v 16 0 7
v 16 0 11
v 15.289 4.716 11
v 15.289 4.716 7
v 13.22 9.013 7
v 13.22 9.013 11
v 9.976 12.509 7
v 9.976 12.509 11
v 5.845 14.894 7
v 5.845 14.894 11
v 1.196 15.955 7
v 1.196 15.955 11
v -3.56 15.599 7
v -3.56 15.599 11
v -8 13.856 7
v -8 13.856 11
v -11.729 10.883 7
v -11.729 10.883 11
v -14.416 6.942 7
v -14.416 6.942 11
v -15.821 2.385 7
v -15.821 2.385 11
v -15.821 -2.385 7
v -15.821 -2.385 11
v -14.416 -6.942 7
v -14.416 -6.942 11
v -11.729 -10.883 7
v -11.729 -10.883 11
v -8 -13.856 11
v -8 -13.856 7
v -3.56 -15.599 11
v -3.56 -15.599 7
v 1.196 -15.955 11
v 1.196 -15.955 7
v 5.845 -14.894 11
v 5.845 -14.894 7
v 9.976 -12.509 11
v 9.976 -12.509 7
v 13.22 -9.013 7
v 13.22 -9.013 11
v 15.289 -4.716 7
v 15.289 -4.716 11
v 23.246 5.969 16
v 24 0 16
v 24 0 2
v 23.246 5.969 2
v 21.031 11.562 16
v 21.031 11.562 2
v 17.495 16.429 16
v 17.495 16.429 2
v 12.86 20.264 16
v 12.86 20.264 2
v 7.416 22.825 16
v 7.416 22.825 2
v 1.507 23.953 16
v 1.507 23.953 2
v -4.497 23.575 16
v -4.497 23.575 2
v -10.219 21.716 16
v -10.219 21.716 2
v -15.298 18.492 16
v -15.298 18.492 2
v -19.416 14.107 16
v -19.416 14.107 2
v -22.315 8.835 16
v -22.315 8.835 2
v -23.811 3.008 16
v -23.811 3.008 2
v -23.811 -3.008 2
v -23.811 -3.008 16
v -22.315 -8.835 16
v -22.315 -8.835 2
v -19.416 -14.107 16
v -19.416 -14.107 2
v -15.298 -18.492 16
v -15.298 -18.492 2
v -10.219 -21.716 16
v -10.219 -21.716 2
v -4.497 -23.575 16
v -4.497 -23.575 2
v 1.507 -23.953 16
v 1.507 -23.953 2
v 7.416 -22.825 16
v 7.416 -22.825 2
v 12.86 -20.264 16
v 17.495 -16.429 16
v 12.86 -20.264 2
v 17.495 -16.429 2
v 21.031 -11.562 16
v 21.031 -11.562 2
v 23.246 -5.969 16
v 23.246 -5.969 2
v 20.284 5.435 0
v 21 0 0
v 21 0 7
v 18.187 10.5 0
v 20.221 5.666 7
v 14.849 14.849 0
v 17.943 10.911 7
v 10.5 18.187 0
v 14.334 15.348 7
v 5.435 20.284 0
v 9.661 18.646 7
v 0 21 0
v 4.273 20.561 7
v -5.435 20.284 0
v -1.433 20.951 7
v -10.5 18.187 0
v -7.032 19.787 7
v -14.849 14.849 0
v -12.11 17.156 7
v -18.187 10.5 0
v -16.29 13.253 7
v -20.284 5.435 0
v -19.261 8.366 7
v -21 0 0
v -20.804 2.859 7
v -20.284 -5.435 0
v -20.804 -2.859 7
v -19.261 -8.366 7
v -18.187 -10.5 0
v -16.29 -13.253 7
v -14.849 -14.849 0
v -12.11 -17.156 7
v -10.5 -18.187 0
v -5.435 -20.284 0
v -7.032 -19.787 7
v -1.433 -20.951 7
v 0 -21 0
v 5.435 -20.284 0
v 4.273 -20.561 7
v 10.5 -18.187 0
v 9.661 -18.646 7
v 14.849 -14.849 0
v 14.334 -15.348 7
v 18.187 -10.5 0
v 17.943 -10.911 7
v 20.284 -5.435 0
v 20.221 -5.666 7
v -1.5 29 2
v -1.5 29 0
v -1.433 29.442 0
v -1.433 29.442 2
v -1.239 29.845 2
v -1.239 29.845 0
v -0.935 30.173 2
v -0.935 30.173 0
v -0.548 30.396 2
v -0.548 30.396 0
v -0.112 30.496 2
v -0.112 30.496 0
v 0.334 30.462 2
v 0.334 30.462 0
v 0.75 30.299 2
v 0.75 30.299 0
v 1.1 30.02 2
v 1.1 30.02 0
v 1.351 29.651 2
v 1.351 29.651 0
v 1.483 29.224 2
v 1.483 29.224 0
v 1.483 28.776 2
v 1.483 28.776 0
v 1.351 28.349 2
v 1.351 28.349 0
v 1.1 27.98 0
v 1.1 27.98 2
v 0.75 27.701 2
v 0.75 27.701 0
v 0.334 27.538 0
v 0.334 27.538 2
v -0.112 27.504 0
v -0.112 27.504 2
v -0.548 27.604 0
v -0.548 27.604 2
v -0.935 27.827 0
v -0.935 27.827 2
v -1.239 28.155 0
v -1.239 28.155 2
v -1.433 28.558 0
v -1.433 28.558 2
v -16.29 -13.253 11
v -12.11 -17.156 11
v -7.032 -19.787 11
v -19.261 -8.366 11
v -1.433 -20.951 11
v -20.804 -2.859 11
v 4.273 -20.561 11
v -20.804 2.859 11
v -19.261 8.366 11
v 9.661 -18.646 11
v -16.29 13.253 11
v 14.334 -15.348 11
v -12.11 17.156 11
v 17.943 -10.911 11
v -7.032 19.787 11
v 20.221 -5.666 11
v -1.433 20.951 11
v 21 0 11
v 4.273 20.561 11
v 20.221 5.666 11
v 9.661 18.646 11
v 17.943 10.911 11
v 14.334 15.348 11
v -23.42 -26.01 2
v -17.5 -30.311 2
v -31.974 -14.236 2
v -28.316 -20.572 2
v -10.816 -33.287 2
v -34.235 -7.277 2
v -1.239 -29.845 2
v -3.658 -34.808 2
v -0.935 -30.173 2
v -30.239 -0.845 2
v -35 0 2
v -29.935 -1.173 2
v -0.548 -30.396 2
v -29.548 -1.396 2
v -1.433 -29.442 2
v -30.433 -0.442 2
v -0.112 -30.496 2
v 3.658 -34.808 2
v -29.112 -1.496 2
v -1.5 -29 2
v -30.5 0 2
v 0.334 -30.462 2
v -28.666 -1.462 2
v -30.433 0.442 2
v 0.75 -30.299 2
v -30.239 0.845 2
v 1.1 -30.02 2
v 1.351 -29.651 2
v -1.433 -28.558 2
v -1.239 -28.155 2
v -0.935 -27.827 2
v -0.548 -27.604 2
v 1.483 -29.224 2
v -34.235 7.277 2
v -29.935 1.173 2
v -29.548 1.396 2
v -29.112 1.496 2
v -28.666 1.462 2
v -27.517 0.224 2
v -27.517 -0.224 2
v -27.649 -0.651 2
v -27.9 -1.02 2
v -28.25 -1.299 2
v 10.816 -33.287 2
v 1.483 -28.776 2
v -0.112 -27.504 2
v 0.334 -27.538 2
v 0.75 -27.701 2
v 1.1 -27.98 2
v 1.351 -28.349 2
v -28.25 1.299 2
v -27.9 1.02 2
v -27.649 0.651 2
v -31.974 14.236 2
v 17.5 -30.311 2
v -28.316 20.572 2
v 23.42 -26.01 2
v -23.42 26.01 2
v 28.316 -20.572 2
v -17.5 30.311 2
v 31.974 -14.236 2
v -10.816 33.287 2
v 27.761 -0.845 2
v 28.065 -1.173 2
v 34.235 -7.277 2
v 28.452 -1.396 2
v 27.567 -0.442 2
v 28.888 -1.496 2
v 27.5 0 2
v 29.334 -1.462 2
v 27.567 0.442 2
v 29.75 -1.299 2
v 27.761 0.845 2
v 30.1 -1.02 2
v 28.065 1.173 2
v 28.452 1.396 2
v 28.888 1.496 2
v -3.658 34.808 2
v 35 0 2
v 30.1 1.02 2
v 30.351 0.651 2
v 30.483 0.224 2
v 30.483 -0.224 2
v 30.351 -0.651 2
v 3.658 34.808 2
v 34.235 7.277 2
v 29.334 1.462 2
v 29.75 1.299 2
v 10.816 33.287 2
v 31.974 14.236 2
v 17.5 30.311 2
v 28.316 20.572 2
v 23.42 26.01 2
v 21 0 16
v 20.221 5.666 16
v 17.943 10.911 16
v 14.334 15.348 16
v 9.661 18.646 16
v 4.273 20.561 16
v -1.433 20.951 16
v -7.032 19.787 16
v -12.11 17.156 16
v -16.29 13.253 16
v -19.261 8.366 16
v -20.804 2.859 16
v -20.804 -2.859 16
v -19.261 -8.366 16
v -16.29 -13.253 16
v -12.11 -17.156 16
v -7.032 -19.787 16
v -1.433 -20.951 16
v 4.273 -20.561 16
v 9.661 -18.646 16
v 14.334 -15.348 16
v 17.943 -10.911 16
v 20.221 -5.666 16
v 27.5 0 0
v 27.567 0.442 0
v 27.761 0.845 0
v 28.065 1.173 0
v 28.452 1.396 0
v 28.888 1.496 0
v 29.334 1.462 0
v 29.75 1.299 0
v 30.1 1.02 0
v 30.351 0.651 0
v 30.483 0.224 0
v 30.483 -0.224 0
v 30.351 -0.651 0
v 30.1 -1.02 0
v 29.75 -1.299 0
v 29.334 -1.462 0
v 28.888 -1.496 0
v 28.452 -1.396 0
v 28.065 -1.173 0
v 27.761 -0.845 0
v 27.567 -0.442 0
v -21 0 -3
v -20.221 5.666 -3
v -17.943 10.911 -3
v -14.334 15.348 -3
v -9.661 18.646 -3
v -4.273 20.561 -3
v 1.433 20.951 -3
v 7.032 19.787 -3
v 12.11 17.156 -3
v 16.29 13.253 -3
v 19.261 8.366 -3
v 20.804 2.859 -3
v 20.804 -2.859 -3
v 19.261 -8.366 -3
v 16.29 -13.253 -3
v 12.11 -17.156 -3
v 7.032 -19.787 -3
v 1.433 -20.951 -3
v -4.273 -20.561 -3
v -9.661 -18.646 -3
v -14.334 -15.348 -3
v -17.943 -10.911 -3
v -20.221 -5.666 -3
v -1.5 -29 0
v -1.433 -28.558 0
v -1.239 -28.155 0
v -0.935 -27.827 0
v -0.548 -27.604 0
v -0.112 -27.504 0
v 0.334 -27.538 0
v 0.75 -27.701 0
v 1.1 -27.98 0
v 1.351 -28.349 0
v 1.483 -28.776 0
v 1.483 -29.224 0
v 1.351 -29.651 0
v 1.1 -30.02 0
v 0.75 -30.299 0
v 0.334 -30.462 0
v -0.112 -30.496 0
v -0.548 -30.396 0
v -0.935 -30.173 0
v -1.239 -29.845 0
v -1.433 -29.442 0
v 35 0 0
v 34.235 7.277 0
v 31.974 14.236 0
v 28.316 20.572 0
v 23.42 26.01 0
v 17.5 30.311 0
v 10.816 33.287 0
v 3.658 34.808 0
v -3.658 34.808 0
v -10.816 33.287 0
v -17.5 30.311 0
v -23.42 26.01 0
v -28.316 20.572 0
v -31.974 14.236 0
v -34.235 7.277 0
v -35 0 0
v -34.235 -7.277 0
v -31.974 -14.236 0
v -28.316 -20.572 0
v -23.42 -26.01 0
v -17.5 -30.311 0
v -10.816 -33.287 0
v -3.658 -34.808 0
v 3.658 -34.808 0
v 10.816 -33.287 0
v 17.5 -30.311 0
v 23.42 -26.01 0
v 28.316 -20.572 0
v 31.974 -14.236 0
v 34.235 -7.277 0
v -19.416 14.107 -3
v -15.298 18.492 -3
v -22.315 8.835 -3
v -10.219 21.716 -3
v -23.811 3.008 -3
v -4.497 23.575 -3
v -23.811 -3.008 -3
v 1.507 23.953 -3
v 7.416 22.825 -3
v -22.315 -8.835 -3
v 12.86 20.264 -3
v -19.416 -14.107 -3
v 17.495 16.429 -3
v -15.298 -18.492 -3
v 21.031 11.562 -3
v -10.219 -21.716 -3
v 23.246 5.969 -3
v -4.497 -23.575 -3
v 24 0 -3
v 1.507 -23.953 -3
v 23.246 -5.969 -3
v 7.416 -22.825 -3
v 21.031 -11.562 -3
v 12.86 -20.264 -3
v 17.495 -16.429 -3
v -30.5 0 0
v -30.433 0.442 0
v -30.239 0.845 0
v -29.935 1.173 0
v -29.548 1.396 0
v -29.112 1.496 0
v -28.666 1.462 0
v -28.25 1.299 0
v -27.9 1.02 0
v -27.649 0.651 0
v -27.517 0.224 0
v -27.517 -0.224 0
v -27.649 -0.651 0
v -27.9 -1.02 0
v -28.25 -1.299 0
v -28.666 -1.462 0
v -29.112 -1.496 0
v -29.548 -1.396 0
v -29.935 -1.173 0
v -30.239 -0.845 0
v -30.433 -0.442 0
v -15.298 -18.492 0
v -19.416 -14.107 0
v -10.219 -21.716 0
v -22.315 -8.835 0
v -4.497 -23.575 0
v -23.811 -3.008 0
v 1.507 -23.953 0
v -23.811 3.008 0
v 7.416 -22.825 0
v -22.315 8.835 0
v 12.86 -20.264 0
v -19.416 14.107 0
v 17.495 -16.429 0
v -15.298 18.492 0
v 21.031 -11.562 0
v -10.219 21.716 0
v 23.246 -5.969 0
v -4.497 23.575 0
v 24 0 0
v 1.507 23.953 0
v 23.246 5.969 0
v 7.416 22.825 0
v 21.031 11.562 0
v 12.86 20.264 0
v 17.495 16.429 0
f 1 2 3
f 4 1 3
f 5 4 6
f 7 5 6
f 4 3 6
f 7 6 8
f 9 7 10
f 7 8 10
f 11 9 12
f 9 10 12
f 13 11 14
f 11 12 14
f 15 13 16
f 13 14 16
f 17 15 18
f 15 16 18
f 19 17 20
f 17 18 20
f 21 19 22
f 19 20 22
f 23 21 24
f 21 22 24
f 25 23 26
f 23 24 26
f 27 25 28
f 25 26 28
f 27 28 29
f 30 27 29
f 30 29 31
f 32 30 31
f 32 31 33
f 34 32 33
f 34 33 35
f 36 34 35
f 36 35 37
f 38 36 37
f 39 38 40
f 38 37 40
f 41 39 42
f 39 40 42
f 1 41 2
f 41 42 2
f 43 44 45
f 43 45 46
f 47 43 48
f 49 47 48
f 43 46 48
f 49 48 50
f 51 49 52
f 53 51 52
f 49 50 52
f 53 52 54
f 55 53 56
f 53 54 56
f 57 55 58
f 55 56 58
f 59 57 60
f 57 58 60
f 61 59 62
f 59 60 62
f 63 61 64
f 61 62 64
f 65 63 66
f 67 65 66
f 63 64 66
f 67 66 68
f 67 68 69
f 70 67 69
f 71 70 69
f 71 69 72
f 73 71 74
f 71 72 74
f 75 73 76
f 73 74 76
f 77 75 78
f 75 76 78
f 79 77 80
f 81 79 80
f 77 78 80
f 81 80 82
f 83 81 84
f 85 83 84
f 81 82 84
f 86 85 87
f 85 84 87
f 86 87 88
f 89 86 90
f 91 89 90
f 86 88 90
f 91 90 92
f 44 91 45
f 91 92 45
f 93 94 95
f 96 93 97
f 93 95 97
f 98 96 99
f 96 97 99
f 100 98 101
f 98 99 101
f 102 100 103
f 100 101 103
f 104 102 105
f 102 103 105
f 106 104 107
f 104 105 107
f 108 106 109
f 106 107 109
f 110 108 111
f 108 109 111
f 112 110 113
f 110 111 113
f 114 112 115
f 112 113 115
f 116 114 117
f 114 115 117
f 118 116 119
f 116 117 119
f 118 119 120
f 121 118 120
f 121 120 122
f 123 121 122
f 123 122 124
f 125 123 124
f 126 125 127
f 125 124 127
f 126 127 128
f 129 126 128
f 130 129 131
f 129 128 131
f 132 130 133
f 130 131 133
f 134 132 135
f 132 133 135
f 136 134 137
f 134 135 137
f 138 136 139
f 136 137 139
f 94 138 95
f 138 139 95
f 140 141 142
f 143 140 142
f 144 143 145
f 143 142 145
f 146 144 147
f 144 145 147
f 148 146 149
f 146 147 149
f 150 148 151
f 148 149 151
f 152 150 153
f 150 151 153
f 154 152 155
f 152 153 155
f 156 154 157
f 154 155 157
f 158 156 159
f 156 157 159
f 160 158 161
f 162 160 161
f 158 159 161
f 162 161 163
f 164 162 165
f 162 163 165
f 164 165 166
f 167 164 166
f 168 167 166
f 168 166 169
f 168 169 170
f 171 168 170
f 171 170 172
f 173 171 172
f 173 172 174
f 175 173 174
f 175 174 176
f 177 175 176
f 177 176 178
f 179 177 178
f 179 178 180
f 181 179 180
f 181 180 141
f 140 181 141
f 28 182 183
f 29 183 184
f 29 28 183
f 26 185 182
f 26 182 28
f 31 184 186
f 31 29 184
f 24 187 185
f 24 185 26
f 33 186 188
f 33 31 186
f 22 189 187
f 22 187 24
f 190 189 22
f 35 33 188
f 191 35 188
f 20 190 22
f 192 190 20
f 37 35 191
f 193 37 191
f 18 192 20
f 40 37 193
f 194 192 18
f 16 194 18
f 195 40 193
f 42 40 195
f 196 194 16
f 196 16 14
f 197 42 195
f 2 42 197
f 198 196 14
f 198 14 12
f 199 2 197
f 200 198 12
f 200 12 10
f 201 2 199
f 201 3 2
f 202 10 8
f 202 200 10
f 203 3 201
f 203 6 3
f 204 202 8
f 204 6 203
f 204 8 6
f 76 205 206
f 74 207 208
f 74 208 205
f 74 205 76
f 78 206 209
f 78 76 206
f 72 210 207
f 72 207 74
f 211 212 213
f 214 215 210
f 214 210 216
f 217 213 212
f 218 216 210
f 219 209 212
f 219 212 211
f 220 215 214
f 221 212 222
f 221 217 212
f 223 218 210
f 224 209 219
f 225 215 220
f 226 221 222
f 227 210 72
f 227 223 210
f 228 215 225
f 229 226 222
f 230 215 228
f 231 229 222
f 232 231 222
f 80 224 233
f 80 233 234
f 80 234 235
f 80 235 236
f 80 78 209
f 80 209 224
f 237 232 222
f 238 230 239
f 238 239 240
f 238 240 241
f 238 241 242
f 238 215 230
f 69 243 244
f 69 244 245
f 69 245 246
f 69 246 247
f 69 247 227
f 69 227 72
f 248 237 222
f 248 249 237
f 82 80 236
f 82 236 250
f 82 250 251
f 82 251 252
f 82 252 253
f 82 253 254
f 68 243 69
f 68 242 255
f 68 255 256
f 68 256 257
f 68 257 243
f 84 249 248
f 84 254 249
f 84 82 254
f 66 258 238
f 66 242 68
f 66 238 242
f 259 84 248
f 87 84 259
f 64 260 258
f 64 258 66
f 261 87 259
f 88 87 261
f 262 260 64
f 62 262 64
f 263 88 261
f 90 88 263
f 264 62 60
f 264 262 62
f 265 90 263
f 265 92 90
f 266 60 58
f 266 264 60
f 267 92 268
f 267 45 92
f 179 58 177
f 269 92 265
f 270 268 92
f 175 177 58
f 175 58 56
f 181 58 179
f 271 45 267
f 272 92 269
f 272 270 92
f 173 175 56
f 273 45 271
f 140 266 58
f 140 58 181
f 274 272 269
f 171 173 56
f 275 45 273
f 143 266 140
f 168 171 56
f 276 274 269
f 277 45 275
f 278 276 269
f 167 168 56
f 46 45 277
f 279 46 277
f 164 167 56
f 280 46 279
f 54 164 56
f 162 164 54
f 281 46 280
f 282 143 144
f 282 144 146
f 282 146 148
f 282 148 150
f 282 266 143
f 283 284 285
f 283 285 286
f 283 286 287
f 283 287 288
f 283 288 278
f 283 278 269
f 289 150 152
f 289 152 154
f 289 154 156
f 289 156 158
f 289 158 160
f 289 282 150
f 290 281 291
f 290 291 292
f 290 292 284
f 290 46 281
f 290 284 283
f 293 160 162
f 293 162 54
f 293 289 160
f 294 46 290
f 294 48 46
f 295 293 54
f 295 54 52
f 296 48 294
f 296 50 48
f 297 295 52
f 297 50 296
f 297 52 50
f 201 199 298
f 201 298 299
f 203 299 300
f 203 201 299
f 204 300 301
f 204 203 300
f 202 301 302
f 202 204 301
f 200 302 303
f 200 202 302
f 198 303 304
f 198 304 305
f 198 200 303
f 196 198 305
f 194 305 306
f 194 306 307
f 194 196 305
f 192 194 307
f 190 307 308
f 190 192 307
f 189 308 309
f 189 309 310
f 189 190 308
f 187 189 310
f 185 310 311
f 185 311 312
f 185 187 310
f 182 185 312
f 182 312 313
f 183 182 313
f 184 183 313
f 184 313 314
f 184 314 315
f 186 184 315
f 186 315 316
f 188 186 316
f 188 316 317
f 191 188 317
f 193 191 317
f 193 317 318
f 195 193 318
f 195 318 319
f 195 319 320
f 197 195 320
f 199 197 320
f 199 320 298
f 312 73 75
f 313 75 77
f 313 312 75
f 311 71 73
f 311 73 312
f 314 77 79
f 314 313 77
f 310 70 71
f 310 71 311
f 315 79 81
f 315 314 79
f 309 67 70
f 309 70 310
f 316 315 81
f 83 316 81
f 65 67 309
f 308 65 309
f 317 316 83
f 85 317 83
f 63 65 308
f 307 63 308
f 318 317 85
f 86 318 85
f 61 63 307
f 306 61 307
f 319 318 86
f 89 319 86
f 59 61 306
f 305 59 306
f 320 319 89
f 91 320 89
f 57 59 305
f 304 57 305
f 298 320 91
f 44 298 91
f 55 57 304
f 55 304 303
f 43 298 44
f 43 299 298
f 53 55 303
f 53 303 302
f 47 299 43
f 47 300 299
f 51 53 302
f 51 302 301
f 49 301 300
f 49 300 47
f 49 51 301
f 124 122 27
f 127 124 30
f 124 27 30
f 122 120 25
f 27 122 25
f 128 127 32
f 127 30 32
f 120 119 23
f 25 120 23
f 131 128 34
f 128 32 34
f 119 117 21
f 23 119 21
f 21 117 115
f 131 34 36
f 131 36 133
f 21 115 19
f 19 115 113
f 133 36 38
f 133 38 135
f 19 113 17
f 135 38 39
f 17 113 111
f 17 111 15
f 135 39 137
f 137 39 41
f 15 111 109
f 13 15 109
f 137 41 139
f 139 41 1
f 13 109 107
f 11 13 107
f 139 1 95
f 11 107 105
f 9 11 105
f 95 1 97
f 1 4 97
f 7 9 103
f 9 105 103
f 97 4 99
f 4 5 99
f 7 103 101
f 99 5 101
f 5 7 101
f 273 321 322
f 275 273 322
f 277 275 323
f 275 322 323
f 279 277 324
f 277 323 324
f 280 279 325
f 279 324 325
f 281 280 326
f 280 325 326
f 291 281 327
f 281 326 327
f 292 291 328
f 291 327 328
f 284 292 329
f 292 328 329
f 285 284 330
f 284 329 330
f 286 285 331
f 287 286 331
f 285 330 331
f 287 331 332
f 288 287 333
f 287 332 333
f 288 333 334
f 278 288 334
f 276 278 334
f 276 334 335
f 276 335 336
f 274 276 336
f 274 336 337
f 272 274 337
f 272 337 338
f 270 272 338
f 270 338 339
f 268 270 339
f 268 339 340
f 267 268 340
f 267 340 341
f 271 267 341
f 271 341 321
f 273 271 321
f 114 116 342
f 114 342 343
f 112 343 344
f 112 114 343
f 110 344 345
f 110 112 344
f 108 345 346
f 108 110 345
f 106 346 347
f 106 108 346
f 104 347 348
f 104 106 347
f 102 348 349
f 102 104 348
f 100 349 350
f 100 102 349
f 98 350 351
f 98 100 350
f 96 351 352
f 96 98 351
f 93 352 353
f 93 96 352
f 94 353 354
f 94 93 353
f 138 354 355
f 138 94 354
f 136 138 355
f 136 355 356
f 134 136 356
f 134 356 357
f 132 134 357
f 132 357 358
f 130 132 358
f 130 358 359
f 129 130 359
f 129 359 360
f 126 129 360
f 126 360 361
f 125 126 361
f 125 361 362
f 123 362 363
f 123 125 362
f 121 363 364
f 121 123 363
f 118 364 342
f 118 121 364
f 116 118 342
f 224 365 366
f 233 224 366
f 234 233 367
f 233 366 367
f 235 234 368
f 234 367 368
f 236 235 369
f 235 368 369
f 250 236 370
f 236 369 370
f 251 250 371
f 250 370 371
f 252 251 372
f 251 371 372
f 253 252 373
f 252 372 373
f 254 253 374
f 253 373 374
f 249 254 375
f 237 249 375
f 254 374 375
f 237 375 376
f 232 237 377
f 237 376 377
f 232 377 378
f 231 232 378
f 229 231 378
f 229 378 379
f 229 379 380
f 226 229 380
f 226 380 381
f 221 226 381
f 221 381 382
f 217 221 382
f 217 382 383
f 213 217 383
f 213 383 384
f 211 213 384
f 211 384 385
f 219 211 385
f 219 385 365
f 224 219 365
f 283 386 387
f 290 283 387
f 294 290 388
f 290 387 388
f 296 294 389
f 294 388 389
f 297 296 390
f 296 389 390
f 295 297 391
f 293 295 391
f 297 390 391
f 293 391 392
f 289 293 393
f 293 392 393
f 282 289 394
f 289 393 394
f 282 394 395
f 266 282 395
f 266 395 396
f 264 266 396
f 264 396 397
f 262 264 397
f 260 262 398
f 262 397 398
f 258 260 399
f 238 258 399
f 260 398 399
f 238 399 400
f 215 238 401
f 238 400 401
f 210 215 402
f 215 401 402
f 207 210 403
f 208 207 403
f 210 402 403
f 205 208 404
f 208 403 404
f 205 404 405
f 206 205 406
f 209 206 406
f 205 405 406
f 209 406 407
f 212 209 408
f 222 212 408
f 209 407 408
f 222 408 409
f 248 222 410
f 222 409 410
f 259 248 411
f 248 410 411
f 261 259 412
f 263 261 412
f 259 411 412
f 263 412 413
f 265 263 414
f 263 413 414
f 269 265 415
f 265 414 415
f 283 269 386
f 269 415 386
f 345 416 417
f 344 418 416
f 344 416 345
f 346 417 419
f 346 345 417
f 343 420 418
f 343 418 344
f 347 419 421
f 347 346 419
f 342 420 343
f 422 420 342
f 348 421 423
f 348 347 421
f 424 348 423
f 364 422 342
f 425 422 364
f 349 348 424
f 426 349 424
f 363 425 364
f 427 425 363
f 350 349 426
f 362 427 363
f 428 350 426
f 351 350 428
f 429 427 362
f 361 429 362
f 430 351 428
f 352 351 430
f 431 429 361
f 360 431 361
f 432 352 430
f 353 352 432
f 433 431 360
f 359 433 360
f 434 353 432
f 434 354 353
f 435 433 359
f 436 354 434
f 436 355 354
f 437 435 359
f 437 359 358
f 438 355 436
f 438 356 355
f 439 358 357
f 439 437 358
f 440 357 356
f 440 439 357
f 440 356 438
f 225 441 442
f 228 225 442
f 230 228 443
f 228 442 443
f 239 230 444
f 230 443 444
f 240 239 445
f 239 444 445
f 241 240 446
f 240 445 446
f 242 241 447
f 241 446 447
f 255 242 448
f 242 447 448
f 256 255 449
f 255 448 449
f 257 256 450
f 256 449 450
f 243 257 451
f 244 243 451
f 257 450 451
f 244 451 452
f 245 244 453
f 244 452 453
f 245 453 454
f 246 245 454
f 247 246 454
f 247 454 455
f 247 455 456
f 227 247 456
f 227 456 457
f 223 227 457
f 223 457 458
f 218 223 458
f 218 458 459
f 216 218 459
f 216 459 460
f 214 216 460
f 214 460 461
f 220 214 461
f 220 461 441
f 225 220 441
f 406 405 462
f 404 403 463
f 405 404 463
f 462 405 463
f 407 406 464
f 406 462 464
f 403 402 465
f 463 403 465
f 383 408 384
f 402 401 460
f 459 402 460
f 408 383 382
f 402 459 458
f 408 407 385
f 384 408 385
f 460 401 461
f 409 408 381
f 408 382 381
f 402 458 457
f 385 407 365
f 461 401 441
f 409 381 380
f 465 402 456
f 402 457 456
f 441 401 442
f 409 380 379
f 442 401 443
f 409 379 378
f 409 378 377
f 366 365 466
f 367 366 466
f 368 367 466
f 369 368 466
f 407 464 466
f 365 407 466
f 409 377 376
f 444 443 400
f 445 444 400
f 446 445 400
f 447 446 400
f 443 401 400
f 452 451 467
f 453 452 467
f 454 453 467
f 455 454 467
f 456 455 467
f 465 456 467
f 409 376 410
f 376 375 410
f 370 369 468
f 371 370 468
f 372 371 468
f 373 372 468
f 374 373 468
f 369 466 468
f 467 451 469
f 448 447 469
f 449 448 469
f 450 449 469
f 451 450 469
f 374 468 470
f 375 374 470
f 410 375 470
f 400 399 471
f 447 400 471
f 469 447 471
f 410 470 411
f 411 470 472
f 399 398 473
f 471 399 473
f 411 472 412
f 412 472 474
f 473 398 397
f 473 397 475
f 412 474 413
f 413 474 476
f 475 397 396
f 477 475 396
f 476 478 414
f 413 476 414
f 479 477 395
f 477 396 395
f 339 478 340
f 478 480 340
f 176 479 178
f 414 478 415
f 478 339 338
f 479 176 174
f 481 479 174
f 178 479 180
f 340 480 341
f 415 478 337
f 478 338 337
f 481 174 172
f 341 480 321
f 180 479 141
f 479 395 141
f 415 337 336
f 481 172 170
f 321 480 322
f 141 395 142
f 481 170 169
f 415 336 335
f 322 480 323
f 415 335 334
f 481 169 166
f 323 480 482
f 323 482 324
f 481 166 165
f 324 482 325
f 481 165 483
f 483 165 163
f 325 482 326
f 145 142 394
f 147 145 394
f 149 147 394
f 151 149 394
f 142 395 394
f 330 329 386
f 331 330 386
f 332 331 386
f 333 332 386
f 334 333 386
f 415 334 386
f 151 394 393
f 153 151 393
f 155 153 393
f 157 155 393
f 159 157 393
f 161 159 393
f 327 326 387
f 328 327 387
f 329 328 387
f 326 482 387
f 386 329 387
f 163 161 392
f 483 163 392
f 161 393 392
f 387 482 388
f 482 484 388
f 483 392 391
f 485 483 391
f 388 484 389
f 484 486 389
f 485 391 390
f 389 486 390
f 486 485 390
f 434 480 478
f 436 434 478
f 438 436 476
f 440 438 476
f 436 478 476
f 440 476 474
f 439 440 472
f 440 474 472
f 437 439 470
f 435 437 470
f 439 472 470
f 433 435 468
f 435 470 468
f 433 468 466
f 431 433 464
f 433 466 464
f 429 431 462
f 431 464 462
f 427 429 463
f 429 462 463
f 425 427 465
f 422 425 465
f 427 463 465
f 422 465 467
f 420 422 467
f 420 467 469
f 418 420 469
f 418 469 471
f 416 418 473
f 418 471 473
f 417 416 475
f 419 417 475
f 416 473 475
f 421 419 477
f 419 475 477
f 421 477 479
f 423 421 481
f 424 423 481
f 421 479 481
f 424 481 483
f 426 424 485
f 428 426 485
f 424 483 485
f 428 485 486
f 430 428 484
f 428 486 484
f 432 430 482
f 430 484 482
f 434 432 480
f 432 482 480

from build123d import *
from build123d.topology import SkipClean

# Parameters (mm, degrees)
SKETCH1_R           = 35
BOSS_EXTRUDE1_DEPTH = 2
SKETCH2_R           = 24
SKETCH2_R_2         = 21
BOSS_EXTRUDE2_DEPTH = 14
SKETCH3_R           = 21
CUT_EXTRUDE1_DEPTH  = 10
CUT_EXTRUDE2_REACH  = 54.019
SKETCH4_R           = 1.5
BOSS_EXTRUDE3_START = -5
SKETCH5_R           = 21
SKETCH5_R_2         = 16
BOSS_EXTRUDE3_DEPTH = 4
SKETCH6_R           = 24
SKETCH6_R_2         = 21
BOSS_EXTRUDE4_DEPTH = 3


with BuildPart() as part:
    # Sketch1 → Boss-Extrude1 (new body)
    with BuildSketch(Plane.XY):
        Circle(SKETCH1_R)
    extrude(amount=BOSS_EXTRUDE1_DEPTH)

    # Sketch2 → Boss-Extrude2 (add)
    with BuildSketch(Plane.XY.offset(2)):
        Circle(SKETCH2_R)
        Circle(SKETCH2_R_2, mode=Mode.SUBTRACT)
    extrude(amount=BOSS_EXTRUDE2_DEPTH)

    # Sketch3 → Cut-Extrude1 (cut)
    with BuildSketch(Plane.XY.offset(2)):
        Circle(SKETCH3_R)
    extrude(amount=-CUT_EXTRUDE1_DEPTH, mode=Mode.SUBTRACT)

    # Sketch4 → Cut-Extrude2 (cut, up to next)
    with BuildSketch(Plane(origin=(0, 0, 0), x_dir=(-1, 0, 0), z_dir=(0, 0, -1)), mode=Mode.PRIVATE) as cut_extrude2_sk1:
        with Locations((29, 0)):
            Circle(SKETCH4_R)
    cut_extrude2_tool1 = extrude(cut_extrude2_sk1.sketch, amount=-CUT_EXTRUDE2_REACH, mode=Mode.PRIVATE) & part.part
    # Sketch4 → Cut-Extrude2 (cut, up to next)
    with BuildSketch(Plane(origin=(0, 0, 0), x_dir=(-1, 0, 0), z_dir=(0, 0, -1)), mode=Mode.PRIVATE) as cut_extrude2_sk2:
        with Locations((0, -29)):
            Circle(SKETCH4_R)
    cut_extrude2_tool2 = extrude(cut_extrude2_sk2.sketch, amount=-CUT_EXTRUDE2_REACH, mode=Mode.PRIVATE) & part.part
    # Sketch4 → Cut-Extrude2 (cut, up to next)
    with BuildSketch(Plane(origin=(0, 0, 0), x_dir=(-1, 0, 0), z_dir=(0, 0, -1)), mode=Mode.PRIVATE) as cut_extrude2_sk3:
        with Locations((-29, 0)):
            Circle(SKETCH4_R)
    cut_extrude2_tool3 = extrude(cut_extrude2_sk3.sketch, amount=-CUT_EXTRUDE2_REACH, mode=Mode.PRIVATE) & part.part
    # Sketch4 → Cut-Extrude2 (cut, up to next)
    with BuildSketch(Plane(origin=(0, 0, 0), x_dir=(-1, 0, 0), z_dir=(0, 0, -1)), mode=Mode.PRIVATE) as cut_extrude2_sk4:
        with Locations((0, 29)):
            Circle(SKETCH4_R)
    cut_extrude2_tool4 = extrude(cut_extrude2_sk4.sketch, amount=-CUT_EXTRUDE2_REACH, mode=Mode.PRIVATE) & part.part
    add(cut_extrude2_tool1.solids().sort_by_distance((-29, 0, 0))[0], mode=Mode.SUBTRACT)
    add(cut_extrude2_tool2.solids().sort_by_distance((0, -29, 0))[0], mode=Mode.SUBTRACT)
    add(cut_extrude2_tool3.solids().sort_by_distance((29, 0, 0))[0], mode=Mode.SUBTRACT)
    add(cut_extrude2_tool4.solids().sort_by_distance((0, 29, 0))[0], mode=Mode.SUBTRACT)

    # Sketch5 → Boss-Extrude3 (add)
    with BuildSketch(Plane.XY.offset(16).offset(BOSS_EXTRUDE3_START)):
        Circle(SKETCH5_R)
        Circle(SKETCH5_R_2, mode=Mode.SUBTRACT)
    extrude(amount=-BOSS_EXTRUDE3_DEPTH)

    # Sketch6 → Boss-Extrude4 (add)
    with SkipClean():  # the faces are left unmerged after this step: merging them gives an invalid solid
        with BuildSketch(Plane(origin=(0, 0, 0), x_dir=(-1, 0, 0), z_dir=(0, 0, -1))):
            with Locations(Location((0, 0, 0), (0, 0, 180))):
                Circle(SKETCH6_R)
            Circle(SKETCH6_R_2, mode=Mode.SUBTRACT)
        extrude(amount=BOSS_EXTRUDE4_DEPTH)


solid = part.part
